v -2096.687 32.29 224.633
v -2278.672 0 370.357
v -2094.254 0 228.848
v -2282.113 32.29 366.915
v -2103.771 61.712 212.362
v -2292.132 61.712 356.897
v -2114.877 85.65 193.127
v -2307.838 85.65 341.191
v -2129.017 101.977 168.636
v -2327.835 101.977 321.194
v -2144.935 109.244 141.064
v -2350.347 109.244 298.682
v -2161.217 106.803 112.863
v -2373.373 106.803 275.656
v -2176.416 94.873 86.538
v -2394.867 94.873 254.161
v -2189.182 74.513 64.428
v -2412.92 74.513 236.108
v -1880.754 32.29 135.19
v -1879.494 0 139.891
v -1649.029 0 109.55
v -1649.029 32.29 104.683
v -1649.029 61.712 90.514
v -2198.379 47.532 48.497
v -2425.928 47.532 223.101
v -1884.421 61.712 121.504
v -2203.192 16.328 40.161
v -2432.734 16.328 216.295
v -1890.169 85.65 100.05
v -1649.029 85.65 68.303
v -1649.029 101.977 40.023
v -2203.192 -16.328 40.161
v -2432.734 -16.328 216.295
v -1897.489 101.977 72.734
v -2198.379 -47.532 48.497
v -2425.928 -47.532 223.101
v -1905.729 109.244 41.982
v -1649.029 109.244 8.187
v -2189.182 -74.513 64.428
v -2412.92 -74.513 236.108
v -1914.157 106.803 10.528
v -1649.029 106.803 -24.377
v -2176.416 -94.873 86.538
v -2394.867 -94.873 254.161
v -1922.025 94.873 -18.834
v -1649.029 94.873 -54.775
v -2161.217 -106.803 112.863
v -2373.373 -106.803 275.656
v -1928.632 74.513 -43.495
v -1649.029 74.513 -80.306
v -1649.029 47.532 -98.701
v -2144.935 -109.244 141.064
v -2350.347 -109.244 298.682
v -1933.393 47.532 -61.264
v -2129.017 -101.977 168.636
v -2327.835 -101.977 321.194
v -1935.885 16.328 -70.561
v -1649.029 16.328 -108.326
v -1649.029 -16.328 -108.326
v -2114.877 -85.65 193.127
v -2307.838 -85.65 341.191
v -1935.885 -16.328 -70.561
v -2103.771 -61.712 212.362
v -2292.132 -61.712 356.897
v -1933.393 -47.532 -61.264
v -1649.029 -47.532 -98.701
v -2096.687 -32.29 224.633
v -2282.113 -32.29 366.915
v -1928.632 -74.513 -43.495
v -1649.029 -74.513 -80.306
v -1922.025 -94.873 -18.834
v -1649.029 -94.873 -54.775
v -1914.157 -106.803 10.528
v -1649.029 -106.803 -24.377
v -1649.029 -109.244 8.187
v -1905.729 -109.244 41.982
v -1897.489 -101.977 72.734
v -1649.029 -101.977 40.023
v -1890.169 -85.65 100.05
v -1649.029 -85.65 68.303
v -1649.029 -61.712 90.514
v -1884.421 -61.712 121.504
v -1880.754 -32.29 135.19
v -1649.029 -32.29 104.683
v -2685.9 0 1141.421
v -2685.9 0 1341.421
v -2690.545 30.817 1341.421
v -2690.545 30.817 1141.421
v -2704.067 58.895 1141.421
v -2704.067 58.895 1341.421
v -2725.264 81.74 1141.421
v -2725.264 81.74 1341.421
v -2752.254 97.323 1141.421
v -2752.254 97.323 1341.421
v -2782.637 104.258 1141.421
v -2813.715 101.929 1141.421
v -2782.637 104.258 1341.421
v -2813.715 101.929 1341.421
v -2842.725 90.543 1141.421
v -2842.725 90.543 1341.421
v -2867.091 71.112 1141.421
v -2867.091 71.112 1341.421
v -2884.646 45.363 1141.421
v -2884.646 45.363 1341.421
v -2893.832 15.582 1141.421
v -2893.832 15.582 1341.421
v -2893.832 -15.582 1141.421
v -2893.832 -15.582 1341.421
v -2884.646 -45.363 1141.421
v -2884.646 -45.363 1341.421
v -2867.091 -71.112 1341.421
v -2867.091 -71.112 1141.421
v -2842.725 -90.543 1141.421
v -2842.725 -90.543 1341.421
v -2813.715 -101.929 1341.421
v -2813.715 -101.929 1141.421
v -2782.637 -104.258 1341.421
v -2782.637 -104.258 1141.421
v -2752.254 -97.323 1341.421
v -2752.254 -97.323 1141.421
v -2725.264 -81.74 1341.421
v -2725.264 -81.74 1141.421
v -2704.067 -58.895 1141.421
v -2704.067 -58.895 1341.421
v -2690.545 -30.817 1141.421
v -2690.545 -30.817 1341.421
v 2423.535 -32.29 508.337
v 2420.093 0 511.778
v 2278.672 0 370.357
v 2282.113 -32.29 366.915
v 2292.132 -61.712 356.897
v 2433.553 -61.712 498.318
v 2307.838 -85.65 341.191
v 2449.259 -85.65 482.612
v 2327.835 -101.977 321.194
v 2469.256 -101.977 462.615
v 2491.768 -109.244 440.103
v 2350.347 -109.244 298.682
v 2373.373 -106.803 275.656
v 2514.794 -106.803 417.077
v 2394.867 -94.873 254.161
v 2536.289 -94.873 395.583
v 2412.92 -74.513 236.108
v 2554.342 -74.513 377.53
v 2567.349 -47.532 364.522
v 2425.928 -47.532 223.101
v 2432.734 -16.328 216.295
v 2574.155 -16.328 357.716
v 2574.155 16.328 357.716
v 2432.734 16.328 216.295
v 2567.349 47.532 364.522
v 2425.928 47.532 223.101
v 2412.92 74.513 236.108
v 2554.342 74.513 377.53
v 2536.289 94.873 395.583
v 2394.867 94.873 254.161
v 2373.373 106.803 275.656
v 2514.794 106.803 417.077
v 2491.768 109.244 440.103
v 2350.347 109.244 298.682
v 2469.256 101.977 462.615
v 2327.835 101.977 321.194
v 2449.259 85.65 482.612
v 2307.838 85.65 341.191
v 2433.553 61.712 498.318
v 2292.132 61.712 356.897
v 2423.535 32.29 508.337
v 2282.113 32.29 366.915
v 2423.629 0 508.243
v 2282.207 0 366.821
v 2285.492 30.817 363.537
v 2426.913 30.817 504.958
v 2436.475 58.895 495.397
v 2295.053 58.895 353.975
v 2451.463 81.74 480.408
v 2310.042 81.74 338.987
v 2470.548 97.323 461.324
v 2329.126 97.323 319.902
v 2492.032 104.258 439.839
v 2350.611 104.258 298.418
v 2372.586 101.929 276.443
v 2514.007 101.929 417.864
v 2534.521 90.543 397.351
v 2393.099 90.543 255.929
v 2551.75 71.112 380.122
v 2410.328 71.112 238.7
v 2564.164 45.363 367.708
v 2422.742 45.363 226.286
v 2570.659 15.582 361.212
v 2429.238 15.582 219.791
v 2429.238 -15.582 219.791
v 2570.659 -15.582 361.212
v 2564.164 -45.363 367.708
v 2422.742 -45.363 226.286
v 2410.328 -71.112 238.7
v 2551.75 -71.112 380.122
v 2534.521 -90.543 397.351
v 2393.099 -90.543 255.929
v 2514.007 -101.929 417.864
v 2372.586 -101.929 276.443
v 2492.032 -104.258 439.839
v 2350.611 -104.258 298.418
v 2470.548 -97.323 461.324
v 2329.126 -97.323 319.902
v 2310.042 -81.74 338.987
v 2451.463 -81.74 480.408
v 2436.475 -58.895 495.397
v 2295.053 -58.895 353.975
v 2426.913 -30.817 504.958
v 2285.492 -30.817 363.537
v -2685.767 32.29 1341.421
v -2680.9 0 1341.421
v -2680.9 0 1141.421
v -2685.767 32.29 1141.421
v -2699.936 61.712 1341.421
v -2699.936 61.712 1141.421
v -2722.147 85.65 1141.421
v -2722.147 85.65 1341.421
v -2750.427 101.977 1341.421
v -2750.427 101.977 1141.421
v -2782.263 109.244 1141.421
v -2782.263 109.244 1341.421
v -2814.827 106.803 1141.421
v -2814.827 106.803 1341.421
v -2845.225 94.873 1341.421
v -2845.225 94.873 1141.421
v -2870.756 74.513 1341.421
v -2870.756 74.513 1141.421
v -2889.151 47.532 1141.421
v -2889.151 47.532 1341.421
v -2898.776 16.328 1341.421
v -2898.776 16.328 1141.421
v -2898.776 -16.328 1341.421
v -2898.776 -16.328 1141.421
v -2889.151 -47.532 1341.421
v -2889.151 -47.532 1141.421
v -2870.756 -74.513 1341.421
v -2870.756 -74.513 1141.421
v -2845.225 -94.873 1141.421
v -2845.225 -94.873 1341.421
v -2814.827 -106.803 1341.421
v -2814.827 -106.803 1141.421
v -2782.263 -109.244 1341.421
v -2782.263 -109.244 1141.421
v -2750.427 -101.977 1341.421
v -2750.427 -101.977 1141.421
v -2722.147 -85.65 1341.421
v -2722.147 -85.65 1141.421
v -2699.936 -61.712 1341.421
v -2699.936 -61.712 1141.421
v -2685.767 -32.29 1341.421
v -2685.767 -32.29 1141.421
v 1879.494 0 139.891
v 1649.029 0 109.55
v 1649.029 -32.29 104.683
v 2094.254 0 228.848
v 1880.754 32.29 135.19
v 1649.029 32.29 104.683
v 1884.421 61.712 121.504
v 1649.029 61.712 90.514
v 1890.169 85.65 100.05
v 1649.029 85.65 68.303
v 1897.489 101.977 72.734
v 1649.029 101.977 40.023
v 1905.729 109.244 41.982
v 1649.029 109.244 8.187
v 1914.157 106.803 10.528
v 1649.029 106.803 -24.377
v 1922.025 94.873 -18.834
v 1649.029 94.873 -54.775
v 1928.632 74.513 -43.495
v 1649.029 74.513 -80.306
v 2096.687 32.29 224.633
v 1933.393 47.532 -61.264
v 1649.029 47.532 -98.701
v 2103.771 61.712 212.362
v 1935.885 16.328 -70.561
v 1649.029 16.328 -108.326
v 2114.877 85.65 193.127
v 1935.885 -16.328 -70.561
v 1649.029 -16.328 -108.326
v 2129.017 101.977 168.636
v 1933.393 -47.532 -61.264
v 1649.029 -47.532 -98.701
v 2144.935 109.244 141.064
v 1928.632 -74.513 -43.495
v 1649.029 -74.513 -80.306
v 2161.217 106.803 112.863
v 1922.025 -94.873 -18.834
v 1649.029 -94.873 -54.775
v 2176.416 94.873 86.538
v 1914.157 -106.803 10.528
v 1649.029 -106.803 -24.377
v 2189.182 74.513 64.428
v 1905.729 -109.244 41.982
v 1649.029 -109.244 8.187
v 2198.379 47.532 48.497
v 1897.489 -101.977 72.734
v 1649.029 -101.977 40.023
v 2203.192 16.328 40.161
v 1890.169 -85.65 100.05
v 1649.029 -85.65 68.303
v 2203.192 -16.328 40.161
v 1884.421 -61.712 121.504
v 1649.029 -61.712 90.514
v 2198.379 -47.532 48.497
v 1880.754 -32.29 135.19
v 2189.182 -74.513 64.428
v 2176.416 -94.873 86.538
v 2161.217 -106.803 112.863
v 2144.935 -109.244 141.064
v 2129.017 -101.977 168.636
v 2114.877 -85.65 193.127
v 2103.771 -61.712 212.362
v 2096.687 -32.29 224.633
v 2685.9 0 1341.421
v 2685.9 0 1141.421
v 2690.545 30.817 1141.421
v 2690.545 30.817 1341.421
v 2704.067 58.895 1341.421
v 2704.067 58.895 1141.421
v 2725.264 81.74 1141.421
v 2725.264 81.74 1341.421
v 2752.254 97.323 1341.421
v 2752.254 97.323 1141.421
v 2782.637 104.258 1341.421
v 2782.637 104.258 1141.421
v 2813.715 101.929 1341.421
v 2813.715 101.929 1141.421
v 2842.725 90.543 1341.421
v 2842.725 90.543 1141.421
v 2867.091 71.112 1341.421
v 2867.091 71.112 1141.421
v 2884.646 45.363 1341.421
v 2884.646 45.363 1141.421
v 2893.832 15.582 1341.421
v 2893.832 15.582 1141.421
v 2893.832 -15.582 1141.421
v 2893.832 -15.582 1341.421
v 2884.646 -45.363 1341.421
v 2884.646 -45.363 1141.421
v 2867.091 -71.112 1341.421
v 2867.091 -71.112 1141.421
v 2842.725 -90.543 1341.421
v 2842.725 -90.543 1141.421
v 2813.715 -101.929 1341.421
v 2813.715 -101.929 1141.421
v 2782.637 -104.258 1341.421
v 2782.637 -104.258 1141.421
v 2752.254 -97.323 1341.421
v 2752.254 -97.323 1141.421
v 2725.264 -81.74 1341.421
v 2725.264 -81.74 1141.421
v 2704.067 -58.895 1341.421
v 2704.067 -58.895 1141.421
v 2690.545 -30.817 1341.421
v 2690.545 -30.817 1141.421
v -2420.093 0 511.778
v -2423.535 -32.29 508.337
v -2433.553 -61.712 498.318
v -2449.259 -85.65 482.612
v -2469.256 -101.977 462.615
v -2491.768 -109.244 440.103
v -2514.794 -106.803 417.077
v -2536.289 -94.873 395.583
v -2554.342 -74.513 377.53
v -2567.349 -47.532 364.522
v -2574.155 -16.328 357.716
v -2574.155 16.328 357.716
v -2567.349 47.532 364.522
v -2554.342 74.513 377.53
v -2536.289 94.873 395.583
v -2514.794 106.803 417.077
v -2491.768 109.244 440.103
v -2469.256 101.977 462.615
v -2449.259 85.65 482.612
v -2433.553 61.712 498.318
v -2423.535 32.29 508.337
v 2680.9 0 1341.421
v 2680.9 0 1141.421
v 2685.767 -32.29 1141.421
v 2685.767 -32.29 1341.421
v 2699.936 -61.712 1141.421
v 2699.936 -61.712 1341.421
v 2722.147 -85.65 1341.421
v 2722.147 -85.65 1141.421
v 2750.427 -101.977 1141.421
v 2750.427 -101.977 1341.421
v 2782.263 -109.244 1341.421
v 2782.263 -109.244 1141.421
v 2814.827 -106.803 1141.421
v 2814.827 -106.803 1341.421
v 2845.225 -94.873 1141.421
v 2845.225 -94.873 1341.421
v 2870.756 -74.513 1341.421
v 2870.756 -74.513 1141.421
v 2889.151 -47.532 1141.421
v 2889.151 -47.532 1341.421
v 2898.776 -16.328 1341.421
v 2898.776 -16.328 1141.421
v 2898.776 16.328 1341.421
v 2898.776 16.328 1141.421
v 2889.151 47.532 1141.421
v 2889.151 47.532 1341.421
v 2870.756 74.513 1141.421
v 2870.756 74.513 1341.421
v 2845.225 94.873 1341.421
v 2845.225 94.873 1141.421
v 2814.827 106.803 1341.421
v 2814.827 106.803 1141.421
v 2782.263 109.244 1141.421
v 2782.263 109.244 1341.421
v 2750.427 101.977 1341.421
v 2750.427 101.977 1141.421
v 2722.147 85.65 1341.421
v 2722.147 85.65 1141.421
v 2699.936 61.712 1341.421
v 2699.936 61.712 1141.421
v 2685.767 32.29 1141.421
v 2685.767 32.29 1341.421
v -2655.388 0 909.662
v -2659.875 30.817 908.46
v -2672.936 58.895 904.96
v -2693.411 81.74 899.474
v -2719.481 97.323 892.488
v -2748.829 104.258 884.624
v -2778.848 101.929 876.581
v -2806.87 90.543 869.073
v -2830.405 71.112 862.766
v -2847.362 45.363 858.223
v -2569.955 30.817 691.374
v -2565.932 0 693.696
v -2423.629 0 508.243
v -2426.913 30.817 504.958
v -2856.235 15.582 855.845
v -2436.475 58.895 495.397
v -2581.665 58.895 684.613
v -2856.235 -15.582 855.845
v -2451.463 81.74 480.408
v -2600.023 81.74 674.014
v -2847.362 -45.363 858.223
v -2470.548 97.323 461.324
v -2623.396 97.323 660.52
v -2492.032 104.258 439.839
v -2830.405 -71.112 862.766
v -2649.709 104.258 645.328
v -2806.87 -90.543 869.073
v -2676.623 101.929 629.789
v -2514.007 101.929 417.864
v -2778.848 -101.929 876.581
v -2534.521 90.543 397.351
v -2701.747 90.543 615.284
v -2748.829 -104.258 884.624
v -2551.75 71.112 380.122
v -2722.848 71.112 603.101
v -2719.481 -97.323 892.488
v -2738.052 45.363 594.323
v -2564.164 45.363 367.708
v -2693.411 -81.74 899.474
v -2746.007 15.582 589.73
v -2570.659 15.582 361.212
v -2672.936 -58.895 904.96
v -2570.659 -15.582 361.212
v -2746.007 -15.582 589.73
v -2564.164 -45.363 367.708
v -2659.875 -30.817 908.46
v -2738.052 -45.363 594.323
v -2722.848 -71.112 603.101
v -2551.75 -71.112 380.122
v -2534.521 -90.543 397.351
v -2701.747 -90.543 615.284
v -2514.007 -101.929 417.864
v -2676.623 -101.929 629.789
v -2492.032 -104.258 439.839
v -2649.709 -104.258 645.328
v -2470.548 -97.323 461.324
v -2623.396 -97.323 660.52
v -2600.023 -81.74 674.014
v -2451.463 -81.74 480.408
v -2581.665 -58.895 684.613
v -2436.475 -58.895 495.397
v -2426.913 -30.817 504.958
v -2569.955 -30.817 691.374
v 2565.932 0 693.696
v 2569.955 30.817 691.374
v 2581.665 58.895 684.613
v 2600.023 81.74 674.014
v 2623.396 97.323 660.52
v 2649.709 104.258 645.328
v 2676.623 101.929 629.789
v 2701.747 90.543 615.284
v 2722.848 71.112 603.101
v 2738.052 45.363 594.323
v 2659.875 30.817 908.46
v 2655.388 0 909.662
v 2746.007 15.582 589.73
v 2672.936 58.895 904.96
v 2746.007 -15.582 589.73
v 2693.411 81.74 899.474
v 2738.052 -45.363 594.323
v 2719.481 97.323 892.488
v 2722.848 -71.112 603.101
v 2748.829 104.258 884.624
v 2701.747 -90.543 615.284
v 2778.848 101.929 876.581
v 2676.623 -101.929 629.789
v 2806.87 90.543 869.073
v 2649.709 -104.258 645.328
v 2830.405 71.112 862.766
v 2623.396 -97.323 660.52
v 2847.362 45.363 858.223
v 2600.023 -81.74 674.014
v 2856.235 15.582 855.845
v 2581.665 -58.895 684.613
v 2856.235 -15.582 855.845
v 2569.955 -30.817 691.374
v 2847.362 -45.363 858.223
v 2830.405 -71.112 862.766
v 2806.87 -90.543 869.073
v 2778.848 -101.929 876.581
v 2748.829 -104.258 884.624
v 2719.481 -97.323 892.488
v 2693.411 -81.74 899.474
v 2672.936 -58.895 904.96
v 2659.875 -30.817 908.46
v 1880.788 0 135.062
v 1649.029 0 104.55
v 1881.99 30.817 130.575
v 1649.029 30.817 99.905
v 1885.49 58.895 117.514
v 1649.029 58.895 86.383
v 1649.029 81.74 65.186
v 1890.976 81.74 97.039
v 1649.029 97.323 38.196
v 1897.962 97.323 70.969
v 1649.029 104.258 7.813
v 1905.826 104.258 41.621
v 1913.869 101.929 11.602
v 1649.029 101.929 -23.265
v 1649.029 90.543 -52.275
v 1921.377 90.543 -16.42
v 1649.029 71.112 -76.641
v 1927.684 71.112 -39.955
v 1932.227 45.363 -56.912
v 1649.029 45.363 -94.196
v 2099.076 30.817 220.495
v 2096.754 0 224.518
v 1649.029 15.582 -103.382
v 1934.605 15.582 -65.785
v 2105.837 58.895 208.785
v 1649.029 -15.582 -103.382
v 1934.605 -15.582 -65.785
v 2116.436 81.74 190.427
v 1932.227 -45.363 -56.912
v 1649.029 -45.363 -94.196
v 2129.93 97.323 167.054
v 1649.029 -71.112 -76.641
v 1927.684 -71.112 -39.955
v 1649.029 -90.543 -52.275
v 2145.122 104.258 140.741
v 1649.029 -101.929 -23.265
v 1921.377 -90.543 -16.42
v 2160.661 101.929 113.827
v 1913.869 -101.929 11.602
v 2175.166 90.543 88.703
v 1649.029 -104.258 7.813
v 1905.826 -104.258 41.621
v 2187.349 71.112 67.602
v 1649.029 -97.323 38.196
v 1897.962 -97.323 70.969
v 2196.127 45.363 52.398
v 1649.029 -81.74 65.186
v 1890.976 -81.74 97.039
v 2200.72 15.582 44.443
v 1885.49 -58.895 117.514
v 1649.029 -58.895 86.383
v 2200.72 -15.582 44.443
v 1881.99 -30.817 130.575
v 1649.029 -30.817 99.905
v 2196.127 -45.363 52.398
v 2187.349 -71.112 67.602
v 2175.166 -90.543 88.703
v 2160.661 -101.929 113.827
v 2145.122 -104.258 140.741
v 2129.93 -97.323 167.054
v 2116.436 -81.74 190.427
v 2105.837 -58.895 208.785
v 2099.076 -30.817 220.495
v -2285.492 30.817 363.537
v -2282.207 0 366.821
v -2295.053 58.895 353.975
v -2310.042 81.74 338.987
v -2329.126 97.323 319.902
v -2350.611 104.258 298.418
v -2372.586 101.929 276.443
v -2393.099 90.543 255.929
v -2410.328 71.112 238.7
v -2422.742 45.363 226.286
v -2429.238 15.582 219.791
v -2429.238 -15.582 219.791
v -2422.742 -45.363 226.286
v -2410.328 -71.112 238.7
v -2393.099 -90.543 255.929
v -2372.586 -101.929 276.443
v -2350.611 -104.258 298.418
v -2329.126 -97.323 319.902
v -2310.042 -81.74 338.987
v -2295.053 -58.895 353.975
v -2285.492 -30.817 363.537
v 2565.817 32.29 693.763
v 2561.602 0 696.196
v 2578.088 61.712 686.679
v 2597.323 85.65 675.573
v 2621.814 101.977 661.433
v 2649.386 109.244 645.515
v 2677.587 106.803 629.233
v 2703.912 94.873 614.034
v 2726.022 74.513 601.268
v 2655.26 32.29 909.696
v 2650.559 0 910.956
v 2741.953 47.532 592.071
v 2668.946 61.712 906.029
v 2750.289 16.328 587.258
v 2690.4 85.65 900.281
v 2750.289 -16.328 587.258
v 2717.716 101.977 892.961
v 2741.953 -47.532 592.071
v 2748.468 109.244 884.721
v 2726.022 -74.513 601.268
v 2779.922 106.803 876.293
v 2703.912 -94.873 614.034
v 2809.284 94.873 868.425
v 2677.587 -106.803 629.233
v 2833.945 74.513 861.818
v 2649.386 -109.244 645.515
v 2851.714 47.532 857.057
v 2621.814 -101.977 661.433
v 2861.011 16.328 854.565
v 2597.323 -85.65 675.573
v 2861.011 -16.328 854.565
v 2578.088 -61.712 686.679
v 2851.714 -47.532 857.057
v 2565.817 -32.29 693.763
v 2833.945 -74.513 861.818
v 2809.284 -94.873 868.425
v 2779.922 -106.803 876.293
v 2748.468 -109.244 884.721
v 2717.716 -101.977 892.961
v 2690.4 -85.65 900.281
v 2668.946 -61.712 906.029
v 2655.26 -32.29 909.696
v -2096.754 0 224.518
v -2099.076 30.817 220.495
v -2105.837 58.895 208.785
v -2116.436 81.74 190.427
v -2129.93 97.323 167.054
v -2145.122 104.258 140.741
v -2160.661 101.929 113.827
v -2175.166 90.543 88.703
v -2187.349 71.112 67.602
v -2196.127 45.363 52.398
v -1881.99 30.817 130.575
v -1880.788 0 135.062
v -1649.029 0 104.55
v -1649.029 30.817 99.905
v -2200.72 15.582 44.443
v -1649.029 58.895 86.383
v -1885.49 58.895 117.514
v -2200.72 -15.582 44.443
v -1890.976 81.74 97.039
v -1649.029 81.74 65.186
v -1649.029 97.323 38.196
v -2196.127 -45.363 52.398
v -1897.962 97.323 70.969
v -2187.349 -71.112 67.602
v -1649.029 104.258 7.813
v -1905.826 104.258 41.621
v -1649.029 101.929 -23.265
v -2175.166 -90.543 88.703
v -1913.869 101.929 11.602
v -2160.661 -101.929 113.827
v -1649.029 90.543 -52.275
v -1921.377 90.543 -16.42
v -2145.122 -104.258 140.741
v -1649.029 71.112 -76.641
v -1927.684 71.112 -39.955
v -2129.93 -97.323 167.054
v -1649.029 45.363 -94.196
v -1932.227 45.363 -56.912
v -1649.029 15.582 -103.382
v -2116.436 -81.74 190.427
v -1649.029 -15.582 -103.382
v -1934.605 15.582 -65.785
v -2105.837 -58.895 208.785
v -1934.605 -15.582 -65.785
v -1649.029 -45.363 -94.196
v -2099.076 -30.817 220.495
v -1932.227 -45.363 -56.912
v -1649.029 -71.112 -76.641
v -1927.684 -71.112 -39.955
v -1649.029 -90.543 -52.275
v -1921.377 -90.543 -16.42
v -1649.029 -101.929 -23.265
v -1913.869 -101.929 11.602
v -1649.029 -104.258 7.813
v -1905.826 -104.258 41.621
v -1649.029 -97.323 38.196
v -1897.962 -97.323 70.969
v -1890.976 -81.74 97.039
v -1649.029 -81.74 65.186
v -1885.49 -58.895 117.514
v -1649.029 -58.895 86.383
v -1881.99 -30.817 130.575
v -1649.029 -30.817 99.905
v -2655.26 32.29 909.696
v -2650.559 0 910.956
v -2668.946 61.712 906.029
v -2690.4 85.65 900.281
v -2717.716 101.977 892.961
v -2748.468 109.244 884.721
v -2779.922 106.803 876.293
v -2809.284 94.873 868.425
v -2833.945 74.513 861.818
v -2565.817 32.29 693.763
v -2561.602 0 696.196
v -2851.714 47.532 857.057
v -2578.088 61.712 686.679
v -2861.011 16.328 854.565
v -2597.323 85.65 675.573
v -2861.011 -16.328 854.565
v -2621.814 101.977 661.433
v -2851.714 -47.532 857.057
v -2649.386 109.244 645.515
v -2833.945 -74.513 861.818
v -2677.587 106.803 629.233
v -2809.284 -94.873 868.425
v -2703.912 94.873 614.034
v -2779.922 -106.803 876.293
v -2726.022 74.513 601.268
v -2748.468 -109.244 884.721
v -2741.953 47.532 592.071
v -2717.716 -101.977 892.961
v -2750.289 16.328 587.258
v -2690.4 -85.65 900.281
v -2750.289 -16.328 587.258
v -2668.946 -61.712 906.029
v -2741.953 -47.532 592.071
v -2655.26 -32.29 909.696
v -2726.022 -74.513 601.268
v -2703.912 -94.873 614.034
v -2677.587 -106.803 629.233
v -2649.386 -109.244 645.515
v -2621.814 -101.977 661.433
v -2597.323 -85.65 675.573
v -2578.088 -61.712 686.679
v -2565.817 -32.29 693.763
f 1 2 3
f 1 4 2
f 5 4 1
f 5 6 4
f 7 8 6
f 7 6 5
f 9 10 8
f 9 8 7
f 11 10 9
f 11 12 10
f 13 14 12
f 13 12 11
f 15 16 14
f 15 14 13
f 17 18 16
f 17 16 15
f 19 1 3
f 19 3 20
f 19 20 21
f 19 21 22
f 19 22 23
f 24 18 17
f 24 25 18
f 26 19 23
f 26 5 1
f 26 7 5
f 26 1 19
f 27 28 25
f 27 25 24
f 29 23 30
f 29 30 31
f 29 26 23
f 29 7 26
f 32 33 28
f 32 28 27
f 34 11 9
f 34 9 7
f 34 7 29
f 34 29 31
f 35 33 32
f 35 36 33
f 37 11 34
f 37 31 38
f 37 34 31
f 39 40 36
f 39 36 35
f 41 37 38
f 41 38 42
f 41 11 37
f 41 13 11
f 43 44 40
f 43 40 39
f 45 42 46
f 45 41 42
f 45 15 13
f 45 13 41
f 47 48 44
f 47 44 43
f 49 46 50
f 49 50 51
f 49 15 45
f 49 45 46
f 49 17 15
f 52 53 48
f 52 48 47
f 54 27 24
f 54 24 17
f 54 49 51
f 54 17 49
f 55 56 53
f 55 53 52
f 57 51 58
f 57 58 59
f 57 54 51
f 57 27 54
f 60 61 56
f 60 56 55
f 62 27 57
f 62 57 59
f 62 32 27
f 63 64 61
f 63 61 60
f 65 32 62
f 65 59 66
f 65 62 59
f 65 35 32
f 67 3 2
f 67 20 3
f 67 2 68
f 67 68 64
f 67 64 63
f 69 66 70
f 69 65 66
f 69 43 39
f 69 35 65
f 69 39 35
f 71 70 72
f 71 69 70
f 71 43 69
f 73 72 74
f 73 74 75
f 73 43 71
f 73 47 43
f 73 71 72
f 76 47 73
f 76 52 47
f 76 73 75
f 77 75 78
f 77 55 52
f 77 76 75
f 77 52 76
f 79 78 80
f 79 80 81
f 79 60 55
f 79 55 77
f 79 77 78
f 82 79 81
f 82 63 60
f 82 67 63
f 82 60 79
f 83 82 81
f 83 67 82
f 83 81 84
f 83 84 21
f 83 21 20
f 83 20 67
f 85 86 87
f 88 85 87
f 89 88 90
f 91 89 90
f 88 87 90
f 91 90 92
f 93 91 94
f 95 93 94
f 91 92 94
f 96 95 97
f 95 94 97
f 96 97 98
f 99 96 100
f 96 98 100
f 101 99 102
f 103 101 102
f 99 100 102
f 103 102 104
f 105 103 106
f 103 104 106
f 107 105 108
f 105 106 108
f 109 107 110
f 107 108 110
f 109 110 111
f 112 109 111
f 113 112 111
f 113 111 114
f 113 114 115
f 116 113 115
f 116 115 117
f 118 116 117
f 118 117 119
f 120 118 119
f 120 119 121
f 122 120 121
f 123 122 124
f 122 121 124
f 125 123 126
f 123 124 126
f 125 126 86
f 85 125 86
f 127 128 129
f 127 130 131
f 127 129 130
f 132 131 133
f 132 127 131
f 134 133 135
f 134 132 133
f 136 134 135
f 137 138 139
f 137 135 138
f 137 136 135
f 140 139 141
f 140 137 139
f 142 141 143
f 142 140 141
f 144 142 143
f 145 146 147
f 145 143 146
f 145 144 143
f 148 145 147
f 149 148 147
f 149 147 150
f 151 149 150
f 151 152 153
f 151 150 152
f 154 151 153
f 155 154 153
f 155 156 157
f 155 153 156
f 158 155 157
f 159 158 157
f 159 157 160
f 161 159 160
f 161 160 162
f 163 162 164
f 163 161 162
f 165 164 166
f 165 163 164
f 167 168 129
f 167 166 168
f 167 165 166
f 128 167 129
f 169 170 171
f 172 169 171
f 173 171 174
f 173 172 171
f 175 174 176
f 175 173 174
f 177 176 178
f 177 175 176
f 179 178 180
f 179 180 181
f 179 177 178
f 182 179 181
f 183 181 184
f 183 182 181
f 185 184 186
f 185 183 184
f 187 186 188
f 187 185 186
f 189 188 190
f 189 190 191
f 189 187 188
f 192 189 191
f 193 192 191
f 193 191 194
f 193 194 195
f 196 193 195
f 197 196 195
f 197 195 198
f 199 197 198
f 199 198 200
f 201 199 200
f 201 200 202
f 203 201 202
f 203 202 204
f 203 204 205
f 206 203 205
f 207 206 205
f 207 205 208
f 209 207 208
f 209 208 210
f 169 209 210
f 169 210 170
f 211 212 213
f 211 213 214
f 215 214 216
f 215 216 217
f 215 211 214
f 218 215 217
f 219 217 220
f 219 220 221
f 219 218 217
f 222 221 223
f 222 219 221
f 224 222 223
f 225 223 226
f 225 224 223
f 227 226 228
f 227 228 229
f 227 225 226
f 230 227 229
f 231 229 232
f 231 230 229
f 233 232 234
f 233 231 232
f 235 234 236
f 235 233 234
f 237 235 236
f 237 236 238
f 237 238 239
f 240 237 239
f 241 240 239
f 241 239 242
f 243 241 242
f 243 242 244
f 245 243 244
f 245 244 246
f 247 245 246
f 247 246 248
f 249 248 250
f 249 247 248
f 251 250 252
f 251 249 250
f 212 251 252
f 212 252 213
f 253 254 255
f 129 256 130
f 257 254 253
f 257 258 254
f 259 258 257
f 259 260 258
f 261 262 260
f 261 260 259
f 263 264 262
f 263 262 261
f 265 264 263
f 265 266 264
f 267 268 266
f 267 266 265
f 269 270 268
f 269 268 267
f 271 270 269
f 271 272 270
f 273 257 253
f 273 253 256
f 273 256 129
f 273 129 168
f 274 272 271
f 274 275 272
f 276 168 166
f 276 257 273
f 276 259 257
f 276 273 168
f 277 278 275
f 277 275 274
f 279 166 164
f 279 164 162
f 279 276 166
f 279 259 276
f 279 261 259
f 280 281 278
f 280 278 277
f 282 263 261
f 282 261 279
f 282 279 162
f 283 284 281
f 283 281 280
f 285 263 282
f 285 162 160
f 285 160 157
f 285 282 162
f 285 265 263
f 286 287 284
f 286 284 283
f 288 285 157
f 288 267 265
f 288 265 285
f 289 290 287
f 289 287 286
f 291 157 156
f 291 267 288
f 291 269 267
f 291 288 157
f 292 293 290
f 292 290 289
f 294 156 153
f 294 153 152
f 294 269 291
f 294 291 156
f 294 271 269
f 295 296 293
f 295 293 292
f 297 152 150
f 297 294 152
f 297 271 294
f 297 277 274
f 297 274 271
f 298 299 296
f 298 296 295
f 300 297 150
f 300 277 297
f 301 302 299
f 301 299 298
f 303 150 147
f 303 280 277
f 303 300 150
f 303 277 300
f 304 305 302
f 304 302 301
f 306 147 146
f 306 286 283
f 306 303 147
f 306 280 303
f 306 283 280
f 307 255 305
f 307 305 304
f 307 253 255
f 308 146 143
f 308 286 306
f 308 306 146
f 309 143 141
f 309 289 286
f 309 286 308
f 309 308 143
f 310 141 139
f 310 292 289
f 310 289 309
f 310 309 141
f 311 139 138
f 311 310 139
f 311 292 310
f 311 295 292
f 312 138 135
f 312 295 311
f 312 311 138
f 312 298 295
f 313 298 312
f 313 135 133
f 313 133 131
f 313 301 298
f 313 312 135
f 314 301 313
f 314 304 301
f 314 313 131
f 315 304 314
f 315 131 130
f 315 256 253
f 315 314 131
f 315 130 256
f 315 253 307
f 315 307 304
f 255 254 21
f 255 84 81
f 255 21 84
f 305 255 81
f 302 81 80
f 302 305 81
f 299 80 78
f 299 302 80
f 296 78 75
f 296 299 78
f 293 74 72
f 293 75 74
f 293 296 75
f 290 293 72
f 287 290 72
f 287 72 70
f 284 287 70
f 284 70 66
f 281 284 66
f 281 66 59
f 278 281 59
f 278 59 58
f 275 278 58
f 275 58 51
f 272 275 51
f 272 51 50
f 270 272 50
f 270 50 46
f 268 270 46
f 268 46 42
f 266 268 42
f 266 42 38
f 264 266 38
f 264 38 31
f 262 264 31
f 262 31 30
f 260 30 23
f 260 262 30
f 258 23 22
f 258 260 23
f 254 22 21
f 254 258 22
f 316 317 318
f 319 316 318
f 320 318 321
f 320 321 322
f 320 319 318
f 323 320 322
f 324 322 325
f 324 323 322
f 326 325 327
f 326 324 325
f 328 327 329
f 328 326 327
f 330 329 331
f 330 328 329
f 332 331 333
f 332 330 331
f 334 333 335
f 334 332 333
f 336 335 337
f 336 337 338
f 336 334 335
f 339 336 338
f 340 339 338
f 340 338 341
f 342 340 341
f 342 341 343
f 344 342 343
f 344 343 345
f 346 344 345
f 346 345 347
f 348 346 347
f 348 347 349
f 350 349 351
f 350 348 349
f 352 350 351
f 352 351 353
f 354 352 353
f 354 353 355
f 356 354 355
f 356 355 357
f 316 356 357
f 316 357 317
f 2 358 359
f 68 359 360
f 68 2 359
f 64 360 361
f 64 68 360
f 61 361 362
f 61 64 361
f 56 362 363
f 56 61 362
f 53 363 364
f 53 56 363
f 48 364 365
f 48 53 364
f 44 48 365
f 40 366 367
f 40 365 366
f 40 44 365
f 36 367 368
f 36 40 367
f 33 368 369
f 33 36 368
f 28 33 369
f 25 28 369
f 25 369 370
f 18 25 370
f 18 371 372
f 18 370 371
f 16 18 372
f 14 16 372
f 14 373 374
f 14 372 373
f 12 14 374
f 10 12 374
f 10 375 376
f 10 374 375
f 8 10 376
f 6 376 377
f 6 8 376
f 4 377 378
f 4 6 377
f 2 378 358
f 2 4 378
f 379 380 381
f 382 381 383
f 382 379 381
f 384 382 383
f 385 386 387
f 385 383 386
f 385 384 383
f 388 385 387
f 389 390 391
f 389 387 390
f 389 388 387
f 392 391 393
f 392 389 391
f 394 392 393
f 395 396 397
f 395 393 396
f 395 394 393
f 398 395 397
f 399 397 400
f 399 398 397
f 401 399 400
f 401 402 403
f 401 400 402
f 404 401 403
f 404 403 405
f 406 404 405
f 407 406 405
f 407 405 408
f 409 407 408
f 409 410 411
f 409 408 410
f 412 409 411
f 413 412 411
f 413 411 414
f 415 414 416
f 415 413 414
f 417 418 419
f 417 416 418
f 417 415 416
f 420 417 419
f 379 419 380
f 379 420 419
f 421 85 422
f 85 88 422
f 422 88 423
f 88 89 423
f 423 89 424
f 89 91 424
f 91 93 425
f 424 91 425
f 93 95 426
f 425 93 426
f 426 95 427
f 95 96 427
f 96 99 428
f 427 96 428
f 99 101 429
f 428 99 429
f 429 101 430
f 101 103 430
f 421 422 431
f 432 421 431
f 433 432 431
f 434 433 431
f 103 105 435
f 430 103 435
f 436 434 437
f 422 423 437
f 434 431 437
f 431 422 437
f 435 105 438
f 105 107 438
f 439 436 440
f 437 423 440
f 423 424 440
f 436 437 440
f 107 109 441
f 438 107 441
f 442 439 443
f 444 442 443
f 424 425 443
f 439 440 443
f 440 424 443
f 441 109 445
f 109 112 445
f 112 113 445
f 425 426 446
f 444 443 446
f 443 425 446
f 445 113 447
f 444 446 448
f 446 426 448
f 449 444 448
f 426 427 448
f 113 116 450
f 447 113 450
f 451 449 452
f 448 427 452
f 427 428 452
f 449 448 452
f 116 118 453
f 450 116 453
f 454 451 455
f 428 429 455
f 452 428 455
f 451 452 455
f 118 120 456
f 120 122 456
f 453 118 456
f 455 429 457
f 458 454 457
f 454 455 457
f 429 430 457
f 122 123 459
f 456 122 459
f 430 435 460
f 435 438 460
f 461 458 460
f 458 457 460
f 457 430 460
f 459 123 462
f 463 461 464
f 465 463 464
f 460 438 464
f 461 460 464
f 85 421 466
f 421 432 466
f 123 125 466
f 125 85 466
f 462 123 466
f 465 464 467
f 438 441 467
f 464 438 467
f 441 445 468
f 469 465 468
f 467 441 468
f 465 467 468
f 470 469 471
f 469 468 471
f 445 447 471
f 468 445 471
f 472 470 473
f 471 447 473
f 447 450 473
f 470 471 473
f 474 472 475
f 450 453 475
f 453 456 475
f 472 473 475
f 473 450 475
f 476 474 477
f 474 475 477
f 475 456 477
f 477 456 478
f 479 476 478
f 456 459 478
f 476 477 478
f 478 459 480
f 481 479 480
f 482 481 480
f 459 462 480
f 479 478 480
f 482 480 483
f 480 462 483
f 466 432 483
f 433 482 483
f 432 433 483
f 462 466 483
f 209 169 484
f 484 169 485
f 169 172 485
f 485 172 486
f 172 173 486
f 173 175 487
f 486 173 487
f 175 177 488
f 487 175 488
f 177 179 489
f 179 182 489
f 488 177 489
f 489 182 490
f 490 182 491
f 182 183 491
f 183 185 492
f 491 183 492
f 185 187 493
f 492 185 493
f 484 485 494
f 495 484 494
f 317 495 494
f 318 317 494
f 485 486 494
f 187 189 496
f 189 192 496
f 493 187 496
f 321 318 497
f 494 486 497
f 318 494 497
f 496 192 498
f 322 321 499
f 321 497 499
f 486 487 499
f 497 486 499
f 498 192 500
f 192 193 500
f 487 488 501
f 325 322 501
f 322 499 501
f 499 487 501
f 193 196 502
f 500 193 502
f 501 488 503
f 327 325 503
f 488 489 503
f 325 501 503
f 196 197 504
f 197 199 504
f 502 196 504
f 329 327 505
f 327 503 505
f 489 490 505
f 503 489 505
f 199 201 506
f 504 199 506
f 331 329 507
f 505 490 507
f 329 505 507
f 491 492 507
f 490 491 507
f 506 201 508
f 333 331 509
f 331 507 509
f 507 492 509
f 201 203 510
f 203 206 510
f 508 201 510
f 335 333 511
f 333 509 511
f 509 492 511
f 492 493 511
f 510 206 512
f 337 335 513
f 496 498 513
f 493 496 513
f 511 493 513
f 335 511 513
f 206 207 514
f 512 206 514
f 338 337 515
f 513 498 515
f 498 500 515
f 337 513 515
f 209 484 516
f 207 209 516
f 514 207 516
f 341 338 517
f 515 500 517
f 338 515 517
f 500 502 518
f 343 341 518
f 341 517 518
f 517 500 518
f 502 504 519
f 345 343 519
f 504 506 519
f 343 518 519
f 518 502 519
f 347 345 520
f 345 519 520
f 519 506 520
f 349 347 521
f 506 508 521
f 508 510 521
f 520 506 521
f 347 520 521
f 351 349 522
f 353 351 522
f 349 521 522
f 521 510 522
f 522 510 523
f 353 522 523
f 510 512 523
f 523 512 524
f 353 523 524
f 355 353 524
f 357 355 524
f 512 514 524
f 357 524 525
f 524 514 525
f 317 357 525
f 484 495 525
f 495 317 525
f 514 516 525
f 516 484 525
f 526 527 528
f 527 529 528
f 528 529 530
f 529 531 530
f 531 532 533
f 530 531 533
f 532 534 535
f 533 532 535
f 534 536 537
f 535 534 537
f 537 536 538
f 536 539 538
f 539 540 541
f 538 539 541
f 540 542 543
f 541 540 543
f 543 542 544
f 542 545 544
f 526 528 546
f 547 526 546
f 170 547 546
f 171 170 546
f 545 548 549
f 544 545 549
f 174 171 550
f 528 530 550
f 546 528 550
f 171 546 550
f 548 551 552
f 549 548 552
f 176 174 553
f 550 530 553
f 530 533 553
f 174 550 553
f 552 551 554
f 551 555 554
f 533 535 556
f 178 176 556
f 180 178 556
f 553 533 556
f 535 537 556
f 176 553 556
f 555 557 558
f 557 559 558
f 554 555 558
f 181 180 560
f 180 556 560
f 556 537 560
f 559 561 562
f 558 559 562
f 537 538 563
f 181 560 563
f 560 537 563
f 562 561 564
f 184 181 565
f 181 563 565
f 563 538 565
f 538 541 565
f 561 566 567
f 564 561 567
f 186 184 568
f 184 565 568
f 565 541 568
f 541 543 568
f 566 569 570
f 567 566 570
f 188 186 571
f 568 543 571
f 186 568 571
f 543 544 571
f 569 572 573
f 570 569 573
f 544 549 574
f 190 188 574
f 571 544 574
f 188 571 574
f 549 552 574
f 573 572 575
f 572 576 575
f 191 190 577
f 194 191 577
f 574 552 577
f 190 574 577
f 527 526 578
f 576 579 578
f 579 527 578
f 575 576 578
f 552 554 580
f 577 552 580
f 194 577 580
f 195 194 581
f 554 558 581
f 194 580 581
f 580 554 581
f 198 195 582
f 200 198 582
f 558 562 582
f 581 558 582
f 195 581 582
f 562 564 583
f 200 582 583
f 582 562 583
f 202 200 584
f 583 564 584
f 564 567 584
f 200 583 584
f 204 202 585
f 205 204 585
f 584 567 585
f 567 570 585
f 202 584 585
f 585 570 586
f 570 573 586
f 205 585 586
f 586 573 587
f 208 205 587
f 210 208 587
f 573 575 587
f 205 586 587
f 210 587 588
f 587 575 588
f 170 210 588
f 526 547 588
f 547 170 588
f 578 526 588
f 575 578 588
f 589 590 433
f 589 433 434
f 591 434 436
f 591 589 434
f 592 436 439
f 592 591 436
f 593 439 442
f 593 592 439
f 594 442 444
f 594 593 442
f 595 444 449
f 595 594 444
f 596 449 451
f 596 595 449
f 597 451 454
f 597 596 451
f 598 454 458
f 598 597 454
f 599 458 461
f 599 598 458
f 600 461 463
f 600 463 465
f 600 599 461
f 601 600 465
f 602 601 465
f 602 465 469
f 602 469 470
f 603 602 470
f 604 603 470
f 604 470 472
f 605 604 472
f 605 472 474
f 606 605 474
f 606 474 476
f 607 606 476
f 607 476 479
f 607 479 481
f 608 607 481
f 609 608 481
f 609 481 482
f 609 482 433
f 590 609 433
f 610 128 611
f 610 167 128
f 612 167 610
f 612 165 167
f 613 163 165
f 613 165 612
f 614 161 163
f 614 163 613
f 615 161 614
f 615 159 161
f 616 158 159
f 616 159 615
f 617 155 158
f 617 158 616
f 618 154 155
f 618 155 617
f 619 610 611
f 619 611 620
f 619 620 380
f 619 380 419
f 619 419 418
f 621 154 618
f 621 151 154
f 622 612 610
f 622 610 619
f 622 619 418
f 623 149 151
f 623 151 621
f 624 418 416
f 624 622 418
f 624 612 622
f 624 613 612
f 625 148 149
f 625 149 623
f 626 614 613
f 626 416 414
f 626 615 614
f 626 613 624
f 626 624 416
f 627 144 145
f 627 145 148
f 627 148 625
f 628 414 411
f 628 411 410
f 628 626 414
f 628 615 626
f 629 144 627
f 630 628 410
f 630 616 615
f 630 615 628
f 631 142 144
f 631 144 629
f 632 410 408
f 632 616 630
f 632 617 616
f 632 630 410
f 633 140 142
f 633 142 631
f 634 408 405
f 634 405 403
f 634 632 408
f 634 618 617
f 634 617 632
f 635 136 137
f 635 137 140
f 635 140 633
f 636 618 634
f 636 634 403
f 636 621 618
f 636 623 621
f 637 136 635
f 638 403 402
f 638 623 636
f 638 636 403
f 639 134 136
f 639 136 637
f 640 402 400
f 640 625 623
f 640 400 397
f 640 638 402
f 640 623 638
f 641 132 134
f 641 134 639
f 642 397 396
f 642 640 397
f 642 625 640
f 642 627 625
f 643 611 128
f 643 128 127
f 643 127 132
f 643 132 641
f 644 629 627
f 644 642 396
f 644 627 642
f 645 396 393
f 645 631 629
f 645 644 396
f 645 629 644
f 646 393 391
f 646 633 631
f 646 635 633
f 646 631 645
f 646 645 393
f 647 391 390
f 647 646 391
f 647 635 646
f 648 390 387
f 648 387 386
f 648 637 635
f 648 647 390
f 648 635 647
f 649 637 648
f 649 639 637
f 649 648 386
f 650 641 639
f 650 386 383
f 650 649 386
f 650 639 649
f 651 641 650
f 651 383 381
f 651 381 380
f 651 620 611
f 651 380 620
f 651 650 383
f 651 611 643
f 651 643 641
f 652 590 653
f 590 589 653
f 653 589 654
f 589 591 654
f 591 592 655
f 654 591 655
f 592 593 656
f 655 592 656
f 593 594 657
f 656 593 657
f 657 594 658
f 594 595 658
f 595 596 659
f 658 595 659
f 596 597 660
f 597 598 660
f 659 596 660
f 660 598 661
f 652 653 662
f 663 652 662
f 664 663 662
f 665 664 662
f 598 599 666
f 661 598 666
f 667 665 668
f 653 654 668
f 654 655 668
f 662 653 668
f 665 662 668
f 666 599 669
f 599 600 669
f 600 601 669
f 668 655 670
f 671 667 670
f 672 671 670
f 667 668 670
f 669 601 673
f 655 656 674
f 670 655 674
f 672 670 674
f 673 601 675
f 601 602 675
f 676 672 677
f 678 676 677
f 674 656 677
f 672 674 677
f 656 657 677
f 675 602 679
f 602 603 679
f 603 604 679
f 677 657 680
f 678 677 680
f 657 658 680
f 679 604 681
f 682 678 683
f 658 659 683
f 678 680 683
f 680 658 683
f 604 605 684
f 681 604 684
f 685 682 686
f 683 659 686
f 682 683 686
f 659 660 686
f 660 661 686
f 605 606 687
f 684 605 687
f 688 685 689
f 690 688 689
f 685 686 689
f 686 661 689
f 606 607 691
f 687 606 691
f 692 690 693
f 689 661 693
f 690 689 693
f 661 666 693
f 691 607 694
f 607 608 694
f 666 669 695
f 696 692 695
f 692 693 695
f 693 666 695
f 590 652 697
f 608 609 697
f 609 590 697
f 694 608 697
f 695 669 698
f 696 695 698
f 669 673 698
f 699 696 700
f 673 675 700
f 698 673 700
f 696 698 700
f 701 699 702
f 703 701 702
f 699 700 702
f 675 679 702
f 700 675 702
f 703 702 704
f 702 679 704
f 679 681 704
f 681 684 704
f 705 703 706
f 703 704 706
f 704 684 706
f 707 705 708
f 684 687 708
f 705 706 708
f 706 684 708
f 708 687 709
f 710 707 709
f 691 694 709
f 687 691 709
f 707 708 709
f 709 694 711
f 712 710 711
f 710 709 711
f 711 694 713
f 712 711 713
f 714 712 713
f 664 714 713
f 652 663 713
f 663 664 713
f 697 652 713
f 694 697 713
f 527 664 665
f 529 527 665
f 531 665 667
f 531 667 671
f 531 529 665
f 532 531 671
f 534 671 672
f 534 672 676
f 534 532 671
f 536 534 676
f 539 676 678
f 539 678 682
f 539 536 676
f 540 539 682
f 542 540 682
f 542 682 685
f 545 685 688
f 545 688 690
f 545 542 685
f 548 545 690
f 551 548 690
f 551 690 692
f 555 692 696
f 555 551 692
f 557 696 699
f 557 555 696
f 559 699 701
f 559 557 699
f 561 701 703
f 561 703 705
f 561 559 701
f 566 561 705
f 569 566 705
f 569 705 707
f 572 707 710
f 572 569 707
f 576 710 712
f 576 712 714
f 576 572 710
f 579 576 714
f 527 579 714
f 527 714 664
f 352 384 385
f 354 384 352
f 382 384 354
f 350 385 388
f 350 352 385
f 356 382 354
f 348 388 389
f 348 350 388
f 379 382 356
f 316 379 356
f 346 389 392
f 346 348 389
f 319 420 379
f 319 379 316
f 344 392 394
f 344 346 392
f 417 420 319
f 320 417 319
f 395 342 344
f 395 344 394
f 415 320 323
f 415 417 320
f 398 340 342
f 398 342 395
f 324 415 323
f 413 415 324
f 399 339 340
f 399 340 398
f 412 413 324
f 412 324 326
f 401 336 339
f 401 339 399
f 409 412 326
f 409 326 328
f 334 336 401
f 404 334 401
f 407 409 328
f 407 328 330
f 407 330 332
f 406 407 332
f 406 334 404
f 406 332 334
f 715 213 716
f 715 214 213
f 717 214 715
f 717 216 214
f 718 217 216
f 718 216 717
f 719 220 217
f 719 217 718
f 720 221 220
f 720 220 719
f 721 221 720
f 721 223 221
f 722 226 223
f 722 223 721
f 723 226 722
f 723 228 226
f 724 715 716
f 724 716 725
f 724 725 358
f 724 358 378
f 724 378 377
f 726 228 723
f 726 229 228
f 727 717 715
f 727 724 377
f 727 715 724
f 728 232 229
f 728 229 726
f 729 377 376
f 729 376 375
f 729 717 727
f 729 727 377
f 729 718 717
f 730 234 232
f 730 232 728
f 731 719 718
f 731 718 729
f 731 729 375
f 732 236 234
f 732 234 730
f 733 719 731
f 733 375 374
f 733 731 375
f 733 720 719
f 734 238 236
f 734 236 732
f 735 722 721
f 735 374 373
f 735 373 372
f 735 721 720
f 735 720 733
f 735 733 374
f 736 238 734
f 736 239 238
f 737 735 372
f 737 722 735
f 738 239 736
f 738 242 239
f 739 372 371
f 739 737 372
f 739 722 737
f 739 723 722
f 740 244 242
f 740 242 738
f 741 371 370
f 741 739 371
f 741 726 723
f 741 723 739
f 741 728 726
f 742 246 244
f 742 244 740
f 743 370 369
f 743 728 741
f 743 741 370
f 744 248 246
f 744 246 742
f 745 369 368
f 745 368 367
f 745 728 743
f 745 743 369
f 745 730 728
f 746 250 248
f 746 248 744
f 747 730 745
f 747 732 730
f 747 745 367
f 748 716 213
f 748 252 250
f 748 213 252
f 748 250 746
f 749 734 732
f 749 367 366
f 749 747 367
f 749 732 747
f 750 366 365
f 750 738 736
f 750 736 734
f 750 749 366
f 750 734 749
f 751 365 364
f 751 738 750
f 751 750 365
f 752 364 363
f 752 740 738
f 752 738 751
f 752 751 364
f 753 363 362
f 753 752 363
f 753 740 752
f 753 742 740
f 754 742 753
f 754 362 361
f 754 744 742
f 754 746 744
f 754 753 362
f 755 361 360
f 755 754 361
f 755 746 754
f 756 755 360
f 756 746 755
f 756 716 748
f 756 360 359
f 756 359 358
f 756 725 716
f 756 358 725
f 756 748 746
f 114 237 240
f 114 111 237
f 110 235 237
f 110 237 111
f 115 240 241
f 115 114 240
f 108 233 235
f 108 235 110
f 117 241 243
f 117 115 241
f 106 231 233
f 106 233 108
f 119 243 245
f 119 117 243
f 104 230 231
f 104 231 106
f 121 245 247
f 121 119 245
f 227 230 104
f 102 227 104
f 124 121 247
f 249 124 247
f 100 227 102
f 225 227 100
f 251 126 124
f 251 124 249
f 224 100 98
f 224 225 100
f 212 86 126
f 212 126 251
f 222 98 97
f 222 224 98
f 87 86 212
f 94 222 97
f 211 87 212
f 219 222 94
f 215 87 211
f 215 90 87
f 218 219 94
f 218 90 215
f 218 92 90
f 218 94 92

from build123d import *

# Parameters (mm, degrees)
F2_R        = 109.55
F2_R_2      = 104.55
F3_DEPTH    = 199.999644
F3_FACE_R   = 109.55
F3_FACE_R_2 = 104.55


with BuildPart() as f3:
    # F2 (on offset) → F3 (new body, through all)
    with BuildSketch(Plane.XY.offset(1341.421)):
        with Locations((-2790.45, 0)):
            Circle(F2_R)
        with Locations((-2790.45, 0)):
            Circle(F2_R_2, mode=Mode.SUBTRACT)
    extrude(amount=-F3_DEPTH)

    # F4: sweep along a path in F0
    with BuildLine(Plane.XZ) as f4_path:
        ThreePointArc((-2900, 1141.421356), (-2815.540535, 716.814954), (-2575.020329, 356.851027))
        Line((-2575.020329, 356.851027), (-2433.598973, 215.429671))
        ThreePointArc((-2433.598973, 215.429671), (-2073.635046, -25.090535), (-1649.028644, -109.55))
        Line((-1649.028644, -109.55), (0, -109.55))
        Line((0, -109.55), (1649.028644, -109.55))
        ThreePointArc((1649.028644, -109.55), (2073.635046, -25.090535), (2433.598973, 215.429671))
        Line((2433.598973, 215.429671), (2575.020329, 356.851027))
        ThreePointArc((2575.020329, 356.851027), (2815.540535, 716.814954), (2900, 1141.421356))
        Line((2900, 1141.421356), (2900, 1341.421356))
    # F3_face (on face) → F4 (sweep)
    with BuildSketch(Plane(origin=(-2790.45, 0, 1141.421356), x_dir=(1, 0, 0), z_dir=(0, 0, -1))):
        Circle(F3_FACE_R)
        Circle(F3_FACE_R_2, mode=Mode.SUBTRACT)
    sweep(path=f4_path.line)


solid = f3.part
